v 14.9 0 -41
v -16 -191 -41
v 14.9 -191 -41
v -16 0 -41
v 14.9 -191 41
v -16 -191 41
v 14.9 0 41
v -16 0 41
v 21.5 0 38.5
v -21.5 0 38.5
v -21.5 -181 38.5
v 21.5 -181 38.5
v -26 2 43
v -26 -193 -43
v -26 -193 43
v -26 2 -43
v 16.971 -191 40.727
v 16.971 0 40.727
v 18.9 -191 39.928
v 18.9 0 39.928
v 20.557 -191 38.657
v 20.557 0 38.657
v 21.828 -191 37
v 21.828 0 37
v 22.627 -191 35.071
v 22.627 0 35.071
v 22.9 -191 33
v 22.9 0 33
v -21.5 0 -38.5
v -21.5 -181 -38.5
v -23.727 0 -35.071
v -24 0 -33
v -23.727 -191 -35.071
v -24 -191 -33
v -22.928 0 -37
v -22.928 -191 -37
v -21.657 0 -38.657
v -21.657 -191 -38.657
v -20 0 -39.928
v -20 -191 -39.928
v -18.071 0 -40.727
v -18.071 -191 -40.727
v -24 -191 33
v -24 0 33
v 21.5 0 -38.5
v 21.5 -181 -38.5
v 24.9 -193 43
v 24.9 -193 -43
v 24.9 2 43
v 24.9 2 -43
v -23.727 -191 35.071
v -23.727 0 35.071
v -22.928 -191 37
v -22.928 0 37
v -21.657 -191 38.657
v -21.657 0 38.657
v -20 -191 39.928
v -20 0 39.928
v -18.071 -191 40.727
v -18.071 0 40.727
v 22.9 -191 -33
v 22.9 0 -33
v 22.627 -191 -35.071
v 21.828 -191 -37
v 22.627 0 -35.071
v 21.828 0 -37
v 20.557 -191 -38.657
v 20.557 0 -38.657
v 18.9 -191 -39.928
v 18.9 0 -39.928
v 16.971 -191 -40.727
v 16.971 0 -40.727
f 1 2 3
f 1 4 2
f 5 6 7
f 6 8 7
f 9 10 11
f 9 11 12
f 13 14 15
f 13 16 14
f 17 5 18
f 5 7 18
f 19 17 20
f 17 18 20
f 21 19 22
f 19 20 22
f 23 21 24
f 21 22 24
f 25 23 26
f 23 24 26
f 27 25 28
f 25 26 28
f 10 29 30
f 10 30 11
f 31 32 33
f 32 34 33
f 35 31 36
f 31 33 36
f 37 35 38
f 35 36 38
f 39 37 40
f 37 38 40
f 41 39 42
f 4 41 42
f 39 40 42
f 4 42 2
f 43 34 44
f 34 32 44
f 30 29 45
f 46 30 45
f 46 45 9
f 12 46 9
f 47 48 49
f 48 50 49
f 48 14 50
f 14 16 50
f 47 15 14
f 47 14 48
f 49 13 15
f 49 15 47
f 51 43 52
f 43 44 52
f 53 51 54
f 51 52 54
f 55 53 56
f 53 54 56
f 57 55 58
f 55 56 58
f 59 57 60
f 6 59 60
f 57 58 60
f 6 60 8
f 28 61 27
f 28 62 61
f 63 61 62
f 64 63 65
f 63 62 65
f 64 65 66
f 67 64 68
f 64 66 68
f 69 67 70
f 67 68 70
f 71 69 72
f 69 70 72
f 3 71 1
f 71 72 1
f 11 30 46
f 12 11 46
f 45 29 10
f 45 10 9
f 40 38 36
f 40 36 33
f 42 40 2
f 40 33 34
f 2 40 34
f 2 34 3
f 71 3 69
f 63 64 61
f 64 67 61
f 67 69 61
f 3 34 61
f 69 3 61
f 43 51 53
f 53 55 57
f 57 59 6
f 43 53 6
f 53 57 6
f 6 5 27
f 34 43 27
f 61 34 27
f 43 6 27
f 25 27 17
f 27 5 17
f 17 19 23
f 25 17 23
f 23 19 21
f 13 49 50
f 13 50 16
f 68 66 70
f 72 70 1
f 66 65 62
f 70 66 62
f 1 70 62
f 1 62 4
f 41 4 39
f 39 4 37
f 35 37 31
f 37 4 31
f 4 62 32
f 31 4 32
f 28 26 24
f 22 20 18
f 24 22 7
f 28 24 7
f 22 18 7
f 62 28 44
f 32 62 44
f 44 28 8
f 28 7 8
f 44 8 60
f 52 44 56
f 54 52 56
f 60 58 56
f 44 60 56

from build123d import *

# Parameters (mm, degrees)
F0_W          = 43
F0_H          = 77
F1_DEPTH      = 181
F2_W          = 50.9000002146
F2_H          = 86
F2_W_2        = 46.9000002146
F2_H_2        = 82
F3_DEPTH      = 181
F3_DEPTH_BACK = 10
F4_R          = 8
F5_W          = 50.9000002146
F5_H          = 86
F6_DEPTH      = 2
F7_W          = 50.9000002146
F7_H          = 86
F8_DEPTH      = 2


# Not quite as in the source:
# - a feature names something its author has since deleted; it is built from what else it names


with BuildPart() as f1:
    # F0 (on Front) → F1 (new body)
    with BuildSketch(Plane.XZ):
        Rectangle(F0_W, F0_H)
    extrude(amount=F1_DEPTH)


with BuildPart() as f3:
    # F2 (on face) → F3 (new body, two sides)
    with BuildSketch(Plane.XZ.offset(181)) as f3_sk:
        with Locations((-0.5499998927, 0)):
            Rectangle(F2_W, F2_H)
        with Locations((-0.5499998927, 0)):
            Rectangle(F2_W_2, F2_H_2, mode=Mode.SUBTRACT)
    extrude(amount=-F3_DEPTH)
    extrude(f3_sk.sketch, amount=F3_DEPTH_BACK)

    # F4
    f4_edges = [f3.edges().sort_by_distance(p)[0] for p in [
        (-24, -95.5, 41),
        (22.9, -95.5, 41),
        (22.9, -95.5, -41),
        (-24, -95.5, -41),
    ]]
    fillet(f4_edges, radius=F4_R)

    # F5 (on face) → F6 (join)
    with BuildSketch(Plane(origin=(0, 0, 0), x_dir=(-1, 0, 0), z_dir=(0, 1, 0))):
        with Locations((0.5499998927, 0)):
            Rectangle(F5_W, F5_H)
    extrude(amount=F6_DEPTH)

    # F7 (on face) → F8 (join)
    with BuildSketch(Plane.XZ.offset(191)):
        with Locations((-0.5499998927, 0)):
            Rectangle(F7_W, F7_H)
    extrude(amount=F8_DEPTH)


solid = Compound([f1.part, f3.part])
